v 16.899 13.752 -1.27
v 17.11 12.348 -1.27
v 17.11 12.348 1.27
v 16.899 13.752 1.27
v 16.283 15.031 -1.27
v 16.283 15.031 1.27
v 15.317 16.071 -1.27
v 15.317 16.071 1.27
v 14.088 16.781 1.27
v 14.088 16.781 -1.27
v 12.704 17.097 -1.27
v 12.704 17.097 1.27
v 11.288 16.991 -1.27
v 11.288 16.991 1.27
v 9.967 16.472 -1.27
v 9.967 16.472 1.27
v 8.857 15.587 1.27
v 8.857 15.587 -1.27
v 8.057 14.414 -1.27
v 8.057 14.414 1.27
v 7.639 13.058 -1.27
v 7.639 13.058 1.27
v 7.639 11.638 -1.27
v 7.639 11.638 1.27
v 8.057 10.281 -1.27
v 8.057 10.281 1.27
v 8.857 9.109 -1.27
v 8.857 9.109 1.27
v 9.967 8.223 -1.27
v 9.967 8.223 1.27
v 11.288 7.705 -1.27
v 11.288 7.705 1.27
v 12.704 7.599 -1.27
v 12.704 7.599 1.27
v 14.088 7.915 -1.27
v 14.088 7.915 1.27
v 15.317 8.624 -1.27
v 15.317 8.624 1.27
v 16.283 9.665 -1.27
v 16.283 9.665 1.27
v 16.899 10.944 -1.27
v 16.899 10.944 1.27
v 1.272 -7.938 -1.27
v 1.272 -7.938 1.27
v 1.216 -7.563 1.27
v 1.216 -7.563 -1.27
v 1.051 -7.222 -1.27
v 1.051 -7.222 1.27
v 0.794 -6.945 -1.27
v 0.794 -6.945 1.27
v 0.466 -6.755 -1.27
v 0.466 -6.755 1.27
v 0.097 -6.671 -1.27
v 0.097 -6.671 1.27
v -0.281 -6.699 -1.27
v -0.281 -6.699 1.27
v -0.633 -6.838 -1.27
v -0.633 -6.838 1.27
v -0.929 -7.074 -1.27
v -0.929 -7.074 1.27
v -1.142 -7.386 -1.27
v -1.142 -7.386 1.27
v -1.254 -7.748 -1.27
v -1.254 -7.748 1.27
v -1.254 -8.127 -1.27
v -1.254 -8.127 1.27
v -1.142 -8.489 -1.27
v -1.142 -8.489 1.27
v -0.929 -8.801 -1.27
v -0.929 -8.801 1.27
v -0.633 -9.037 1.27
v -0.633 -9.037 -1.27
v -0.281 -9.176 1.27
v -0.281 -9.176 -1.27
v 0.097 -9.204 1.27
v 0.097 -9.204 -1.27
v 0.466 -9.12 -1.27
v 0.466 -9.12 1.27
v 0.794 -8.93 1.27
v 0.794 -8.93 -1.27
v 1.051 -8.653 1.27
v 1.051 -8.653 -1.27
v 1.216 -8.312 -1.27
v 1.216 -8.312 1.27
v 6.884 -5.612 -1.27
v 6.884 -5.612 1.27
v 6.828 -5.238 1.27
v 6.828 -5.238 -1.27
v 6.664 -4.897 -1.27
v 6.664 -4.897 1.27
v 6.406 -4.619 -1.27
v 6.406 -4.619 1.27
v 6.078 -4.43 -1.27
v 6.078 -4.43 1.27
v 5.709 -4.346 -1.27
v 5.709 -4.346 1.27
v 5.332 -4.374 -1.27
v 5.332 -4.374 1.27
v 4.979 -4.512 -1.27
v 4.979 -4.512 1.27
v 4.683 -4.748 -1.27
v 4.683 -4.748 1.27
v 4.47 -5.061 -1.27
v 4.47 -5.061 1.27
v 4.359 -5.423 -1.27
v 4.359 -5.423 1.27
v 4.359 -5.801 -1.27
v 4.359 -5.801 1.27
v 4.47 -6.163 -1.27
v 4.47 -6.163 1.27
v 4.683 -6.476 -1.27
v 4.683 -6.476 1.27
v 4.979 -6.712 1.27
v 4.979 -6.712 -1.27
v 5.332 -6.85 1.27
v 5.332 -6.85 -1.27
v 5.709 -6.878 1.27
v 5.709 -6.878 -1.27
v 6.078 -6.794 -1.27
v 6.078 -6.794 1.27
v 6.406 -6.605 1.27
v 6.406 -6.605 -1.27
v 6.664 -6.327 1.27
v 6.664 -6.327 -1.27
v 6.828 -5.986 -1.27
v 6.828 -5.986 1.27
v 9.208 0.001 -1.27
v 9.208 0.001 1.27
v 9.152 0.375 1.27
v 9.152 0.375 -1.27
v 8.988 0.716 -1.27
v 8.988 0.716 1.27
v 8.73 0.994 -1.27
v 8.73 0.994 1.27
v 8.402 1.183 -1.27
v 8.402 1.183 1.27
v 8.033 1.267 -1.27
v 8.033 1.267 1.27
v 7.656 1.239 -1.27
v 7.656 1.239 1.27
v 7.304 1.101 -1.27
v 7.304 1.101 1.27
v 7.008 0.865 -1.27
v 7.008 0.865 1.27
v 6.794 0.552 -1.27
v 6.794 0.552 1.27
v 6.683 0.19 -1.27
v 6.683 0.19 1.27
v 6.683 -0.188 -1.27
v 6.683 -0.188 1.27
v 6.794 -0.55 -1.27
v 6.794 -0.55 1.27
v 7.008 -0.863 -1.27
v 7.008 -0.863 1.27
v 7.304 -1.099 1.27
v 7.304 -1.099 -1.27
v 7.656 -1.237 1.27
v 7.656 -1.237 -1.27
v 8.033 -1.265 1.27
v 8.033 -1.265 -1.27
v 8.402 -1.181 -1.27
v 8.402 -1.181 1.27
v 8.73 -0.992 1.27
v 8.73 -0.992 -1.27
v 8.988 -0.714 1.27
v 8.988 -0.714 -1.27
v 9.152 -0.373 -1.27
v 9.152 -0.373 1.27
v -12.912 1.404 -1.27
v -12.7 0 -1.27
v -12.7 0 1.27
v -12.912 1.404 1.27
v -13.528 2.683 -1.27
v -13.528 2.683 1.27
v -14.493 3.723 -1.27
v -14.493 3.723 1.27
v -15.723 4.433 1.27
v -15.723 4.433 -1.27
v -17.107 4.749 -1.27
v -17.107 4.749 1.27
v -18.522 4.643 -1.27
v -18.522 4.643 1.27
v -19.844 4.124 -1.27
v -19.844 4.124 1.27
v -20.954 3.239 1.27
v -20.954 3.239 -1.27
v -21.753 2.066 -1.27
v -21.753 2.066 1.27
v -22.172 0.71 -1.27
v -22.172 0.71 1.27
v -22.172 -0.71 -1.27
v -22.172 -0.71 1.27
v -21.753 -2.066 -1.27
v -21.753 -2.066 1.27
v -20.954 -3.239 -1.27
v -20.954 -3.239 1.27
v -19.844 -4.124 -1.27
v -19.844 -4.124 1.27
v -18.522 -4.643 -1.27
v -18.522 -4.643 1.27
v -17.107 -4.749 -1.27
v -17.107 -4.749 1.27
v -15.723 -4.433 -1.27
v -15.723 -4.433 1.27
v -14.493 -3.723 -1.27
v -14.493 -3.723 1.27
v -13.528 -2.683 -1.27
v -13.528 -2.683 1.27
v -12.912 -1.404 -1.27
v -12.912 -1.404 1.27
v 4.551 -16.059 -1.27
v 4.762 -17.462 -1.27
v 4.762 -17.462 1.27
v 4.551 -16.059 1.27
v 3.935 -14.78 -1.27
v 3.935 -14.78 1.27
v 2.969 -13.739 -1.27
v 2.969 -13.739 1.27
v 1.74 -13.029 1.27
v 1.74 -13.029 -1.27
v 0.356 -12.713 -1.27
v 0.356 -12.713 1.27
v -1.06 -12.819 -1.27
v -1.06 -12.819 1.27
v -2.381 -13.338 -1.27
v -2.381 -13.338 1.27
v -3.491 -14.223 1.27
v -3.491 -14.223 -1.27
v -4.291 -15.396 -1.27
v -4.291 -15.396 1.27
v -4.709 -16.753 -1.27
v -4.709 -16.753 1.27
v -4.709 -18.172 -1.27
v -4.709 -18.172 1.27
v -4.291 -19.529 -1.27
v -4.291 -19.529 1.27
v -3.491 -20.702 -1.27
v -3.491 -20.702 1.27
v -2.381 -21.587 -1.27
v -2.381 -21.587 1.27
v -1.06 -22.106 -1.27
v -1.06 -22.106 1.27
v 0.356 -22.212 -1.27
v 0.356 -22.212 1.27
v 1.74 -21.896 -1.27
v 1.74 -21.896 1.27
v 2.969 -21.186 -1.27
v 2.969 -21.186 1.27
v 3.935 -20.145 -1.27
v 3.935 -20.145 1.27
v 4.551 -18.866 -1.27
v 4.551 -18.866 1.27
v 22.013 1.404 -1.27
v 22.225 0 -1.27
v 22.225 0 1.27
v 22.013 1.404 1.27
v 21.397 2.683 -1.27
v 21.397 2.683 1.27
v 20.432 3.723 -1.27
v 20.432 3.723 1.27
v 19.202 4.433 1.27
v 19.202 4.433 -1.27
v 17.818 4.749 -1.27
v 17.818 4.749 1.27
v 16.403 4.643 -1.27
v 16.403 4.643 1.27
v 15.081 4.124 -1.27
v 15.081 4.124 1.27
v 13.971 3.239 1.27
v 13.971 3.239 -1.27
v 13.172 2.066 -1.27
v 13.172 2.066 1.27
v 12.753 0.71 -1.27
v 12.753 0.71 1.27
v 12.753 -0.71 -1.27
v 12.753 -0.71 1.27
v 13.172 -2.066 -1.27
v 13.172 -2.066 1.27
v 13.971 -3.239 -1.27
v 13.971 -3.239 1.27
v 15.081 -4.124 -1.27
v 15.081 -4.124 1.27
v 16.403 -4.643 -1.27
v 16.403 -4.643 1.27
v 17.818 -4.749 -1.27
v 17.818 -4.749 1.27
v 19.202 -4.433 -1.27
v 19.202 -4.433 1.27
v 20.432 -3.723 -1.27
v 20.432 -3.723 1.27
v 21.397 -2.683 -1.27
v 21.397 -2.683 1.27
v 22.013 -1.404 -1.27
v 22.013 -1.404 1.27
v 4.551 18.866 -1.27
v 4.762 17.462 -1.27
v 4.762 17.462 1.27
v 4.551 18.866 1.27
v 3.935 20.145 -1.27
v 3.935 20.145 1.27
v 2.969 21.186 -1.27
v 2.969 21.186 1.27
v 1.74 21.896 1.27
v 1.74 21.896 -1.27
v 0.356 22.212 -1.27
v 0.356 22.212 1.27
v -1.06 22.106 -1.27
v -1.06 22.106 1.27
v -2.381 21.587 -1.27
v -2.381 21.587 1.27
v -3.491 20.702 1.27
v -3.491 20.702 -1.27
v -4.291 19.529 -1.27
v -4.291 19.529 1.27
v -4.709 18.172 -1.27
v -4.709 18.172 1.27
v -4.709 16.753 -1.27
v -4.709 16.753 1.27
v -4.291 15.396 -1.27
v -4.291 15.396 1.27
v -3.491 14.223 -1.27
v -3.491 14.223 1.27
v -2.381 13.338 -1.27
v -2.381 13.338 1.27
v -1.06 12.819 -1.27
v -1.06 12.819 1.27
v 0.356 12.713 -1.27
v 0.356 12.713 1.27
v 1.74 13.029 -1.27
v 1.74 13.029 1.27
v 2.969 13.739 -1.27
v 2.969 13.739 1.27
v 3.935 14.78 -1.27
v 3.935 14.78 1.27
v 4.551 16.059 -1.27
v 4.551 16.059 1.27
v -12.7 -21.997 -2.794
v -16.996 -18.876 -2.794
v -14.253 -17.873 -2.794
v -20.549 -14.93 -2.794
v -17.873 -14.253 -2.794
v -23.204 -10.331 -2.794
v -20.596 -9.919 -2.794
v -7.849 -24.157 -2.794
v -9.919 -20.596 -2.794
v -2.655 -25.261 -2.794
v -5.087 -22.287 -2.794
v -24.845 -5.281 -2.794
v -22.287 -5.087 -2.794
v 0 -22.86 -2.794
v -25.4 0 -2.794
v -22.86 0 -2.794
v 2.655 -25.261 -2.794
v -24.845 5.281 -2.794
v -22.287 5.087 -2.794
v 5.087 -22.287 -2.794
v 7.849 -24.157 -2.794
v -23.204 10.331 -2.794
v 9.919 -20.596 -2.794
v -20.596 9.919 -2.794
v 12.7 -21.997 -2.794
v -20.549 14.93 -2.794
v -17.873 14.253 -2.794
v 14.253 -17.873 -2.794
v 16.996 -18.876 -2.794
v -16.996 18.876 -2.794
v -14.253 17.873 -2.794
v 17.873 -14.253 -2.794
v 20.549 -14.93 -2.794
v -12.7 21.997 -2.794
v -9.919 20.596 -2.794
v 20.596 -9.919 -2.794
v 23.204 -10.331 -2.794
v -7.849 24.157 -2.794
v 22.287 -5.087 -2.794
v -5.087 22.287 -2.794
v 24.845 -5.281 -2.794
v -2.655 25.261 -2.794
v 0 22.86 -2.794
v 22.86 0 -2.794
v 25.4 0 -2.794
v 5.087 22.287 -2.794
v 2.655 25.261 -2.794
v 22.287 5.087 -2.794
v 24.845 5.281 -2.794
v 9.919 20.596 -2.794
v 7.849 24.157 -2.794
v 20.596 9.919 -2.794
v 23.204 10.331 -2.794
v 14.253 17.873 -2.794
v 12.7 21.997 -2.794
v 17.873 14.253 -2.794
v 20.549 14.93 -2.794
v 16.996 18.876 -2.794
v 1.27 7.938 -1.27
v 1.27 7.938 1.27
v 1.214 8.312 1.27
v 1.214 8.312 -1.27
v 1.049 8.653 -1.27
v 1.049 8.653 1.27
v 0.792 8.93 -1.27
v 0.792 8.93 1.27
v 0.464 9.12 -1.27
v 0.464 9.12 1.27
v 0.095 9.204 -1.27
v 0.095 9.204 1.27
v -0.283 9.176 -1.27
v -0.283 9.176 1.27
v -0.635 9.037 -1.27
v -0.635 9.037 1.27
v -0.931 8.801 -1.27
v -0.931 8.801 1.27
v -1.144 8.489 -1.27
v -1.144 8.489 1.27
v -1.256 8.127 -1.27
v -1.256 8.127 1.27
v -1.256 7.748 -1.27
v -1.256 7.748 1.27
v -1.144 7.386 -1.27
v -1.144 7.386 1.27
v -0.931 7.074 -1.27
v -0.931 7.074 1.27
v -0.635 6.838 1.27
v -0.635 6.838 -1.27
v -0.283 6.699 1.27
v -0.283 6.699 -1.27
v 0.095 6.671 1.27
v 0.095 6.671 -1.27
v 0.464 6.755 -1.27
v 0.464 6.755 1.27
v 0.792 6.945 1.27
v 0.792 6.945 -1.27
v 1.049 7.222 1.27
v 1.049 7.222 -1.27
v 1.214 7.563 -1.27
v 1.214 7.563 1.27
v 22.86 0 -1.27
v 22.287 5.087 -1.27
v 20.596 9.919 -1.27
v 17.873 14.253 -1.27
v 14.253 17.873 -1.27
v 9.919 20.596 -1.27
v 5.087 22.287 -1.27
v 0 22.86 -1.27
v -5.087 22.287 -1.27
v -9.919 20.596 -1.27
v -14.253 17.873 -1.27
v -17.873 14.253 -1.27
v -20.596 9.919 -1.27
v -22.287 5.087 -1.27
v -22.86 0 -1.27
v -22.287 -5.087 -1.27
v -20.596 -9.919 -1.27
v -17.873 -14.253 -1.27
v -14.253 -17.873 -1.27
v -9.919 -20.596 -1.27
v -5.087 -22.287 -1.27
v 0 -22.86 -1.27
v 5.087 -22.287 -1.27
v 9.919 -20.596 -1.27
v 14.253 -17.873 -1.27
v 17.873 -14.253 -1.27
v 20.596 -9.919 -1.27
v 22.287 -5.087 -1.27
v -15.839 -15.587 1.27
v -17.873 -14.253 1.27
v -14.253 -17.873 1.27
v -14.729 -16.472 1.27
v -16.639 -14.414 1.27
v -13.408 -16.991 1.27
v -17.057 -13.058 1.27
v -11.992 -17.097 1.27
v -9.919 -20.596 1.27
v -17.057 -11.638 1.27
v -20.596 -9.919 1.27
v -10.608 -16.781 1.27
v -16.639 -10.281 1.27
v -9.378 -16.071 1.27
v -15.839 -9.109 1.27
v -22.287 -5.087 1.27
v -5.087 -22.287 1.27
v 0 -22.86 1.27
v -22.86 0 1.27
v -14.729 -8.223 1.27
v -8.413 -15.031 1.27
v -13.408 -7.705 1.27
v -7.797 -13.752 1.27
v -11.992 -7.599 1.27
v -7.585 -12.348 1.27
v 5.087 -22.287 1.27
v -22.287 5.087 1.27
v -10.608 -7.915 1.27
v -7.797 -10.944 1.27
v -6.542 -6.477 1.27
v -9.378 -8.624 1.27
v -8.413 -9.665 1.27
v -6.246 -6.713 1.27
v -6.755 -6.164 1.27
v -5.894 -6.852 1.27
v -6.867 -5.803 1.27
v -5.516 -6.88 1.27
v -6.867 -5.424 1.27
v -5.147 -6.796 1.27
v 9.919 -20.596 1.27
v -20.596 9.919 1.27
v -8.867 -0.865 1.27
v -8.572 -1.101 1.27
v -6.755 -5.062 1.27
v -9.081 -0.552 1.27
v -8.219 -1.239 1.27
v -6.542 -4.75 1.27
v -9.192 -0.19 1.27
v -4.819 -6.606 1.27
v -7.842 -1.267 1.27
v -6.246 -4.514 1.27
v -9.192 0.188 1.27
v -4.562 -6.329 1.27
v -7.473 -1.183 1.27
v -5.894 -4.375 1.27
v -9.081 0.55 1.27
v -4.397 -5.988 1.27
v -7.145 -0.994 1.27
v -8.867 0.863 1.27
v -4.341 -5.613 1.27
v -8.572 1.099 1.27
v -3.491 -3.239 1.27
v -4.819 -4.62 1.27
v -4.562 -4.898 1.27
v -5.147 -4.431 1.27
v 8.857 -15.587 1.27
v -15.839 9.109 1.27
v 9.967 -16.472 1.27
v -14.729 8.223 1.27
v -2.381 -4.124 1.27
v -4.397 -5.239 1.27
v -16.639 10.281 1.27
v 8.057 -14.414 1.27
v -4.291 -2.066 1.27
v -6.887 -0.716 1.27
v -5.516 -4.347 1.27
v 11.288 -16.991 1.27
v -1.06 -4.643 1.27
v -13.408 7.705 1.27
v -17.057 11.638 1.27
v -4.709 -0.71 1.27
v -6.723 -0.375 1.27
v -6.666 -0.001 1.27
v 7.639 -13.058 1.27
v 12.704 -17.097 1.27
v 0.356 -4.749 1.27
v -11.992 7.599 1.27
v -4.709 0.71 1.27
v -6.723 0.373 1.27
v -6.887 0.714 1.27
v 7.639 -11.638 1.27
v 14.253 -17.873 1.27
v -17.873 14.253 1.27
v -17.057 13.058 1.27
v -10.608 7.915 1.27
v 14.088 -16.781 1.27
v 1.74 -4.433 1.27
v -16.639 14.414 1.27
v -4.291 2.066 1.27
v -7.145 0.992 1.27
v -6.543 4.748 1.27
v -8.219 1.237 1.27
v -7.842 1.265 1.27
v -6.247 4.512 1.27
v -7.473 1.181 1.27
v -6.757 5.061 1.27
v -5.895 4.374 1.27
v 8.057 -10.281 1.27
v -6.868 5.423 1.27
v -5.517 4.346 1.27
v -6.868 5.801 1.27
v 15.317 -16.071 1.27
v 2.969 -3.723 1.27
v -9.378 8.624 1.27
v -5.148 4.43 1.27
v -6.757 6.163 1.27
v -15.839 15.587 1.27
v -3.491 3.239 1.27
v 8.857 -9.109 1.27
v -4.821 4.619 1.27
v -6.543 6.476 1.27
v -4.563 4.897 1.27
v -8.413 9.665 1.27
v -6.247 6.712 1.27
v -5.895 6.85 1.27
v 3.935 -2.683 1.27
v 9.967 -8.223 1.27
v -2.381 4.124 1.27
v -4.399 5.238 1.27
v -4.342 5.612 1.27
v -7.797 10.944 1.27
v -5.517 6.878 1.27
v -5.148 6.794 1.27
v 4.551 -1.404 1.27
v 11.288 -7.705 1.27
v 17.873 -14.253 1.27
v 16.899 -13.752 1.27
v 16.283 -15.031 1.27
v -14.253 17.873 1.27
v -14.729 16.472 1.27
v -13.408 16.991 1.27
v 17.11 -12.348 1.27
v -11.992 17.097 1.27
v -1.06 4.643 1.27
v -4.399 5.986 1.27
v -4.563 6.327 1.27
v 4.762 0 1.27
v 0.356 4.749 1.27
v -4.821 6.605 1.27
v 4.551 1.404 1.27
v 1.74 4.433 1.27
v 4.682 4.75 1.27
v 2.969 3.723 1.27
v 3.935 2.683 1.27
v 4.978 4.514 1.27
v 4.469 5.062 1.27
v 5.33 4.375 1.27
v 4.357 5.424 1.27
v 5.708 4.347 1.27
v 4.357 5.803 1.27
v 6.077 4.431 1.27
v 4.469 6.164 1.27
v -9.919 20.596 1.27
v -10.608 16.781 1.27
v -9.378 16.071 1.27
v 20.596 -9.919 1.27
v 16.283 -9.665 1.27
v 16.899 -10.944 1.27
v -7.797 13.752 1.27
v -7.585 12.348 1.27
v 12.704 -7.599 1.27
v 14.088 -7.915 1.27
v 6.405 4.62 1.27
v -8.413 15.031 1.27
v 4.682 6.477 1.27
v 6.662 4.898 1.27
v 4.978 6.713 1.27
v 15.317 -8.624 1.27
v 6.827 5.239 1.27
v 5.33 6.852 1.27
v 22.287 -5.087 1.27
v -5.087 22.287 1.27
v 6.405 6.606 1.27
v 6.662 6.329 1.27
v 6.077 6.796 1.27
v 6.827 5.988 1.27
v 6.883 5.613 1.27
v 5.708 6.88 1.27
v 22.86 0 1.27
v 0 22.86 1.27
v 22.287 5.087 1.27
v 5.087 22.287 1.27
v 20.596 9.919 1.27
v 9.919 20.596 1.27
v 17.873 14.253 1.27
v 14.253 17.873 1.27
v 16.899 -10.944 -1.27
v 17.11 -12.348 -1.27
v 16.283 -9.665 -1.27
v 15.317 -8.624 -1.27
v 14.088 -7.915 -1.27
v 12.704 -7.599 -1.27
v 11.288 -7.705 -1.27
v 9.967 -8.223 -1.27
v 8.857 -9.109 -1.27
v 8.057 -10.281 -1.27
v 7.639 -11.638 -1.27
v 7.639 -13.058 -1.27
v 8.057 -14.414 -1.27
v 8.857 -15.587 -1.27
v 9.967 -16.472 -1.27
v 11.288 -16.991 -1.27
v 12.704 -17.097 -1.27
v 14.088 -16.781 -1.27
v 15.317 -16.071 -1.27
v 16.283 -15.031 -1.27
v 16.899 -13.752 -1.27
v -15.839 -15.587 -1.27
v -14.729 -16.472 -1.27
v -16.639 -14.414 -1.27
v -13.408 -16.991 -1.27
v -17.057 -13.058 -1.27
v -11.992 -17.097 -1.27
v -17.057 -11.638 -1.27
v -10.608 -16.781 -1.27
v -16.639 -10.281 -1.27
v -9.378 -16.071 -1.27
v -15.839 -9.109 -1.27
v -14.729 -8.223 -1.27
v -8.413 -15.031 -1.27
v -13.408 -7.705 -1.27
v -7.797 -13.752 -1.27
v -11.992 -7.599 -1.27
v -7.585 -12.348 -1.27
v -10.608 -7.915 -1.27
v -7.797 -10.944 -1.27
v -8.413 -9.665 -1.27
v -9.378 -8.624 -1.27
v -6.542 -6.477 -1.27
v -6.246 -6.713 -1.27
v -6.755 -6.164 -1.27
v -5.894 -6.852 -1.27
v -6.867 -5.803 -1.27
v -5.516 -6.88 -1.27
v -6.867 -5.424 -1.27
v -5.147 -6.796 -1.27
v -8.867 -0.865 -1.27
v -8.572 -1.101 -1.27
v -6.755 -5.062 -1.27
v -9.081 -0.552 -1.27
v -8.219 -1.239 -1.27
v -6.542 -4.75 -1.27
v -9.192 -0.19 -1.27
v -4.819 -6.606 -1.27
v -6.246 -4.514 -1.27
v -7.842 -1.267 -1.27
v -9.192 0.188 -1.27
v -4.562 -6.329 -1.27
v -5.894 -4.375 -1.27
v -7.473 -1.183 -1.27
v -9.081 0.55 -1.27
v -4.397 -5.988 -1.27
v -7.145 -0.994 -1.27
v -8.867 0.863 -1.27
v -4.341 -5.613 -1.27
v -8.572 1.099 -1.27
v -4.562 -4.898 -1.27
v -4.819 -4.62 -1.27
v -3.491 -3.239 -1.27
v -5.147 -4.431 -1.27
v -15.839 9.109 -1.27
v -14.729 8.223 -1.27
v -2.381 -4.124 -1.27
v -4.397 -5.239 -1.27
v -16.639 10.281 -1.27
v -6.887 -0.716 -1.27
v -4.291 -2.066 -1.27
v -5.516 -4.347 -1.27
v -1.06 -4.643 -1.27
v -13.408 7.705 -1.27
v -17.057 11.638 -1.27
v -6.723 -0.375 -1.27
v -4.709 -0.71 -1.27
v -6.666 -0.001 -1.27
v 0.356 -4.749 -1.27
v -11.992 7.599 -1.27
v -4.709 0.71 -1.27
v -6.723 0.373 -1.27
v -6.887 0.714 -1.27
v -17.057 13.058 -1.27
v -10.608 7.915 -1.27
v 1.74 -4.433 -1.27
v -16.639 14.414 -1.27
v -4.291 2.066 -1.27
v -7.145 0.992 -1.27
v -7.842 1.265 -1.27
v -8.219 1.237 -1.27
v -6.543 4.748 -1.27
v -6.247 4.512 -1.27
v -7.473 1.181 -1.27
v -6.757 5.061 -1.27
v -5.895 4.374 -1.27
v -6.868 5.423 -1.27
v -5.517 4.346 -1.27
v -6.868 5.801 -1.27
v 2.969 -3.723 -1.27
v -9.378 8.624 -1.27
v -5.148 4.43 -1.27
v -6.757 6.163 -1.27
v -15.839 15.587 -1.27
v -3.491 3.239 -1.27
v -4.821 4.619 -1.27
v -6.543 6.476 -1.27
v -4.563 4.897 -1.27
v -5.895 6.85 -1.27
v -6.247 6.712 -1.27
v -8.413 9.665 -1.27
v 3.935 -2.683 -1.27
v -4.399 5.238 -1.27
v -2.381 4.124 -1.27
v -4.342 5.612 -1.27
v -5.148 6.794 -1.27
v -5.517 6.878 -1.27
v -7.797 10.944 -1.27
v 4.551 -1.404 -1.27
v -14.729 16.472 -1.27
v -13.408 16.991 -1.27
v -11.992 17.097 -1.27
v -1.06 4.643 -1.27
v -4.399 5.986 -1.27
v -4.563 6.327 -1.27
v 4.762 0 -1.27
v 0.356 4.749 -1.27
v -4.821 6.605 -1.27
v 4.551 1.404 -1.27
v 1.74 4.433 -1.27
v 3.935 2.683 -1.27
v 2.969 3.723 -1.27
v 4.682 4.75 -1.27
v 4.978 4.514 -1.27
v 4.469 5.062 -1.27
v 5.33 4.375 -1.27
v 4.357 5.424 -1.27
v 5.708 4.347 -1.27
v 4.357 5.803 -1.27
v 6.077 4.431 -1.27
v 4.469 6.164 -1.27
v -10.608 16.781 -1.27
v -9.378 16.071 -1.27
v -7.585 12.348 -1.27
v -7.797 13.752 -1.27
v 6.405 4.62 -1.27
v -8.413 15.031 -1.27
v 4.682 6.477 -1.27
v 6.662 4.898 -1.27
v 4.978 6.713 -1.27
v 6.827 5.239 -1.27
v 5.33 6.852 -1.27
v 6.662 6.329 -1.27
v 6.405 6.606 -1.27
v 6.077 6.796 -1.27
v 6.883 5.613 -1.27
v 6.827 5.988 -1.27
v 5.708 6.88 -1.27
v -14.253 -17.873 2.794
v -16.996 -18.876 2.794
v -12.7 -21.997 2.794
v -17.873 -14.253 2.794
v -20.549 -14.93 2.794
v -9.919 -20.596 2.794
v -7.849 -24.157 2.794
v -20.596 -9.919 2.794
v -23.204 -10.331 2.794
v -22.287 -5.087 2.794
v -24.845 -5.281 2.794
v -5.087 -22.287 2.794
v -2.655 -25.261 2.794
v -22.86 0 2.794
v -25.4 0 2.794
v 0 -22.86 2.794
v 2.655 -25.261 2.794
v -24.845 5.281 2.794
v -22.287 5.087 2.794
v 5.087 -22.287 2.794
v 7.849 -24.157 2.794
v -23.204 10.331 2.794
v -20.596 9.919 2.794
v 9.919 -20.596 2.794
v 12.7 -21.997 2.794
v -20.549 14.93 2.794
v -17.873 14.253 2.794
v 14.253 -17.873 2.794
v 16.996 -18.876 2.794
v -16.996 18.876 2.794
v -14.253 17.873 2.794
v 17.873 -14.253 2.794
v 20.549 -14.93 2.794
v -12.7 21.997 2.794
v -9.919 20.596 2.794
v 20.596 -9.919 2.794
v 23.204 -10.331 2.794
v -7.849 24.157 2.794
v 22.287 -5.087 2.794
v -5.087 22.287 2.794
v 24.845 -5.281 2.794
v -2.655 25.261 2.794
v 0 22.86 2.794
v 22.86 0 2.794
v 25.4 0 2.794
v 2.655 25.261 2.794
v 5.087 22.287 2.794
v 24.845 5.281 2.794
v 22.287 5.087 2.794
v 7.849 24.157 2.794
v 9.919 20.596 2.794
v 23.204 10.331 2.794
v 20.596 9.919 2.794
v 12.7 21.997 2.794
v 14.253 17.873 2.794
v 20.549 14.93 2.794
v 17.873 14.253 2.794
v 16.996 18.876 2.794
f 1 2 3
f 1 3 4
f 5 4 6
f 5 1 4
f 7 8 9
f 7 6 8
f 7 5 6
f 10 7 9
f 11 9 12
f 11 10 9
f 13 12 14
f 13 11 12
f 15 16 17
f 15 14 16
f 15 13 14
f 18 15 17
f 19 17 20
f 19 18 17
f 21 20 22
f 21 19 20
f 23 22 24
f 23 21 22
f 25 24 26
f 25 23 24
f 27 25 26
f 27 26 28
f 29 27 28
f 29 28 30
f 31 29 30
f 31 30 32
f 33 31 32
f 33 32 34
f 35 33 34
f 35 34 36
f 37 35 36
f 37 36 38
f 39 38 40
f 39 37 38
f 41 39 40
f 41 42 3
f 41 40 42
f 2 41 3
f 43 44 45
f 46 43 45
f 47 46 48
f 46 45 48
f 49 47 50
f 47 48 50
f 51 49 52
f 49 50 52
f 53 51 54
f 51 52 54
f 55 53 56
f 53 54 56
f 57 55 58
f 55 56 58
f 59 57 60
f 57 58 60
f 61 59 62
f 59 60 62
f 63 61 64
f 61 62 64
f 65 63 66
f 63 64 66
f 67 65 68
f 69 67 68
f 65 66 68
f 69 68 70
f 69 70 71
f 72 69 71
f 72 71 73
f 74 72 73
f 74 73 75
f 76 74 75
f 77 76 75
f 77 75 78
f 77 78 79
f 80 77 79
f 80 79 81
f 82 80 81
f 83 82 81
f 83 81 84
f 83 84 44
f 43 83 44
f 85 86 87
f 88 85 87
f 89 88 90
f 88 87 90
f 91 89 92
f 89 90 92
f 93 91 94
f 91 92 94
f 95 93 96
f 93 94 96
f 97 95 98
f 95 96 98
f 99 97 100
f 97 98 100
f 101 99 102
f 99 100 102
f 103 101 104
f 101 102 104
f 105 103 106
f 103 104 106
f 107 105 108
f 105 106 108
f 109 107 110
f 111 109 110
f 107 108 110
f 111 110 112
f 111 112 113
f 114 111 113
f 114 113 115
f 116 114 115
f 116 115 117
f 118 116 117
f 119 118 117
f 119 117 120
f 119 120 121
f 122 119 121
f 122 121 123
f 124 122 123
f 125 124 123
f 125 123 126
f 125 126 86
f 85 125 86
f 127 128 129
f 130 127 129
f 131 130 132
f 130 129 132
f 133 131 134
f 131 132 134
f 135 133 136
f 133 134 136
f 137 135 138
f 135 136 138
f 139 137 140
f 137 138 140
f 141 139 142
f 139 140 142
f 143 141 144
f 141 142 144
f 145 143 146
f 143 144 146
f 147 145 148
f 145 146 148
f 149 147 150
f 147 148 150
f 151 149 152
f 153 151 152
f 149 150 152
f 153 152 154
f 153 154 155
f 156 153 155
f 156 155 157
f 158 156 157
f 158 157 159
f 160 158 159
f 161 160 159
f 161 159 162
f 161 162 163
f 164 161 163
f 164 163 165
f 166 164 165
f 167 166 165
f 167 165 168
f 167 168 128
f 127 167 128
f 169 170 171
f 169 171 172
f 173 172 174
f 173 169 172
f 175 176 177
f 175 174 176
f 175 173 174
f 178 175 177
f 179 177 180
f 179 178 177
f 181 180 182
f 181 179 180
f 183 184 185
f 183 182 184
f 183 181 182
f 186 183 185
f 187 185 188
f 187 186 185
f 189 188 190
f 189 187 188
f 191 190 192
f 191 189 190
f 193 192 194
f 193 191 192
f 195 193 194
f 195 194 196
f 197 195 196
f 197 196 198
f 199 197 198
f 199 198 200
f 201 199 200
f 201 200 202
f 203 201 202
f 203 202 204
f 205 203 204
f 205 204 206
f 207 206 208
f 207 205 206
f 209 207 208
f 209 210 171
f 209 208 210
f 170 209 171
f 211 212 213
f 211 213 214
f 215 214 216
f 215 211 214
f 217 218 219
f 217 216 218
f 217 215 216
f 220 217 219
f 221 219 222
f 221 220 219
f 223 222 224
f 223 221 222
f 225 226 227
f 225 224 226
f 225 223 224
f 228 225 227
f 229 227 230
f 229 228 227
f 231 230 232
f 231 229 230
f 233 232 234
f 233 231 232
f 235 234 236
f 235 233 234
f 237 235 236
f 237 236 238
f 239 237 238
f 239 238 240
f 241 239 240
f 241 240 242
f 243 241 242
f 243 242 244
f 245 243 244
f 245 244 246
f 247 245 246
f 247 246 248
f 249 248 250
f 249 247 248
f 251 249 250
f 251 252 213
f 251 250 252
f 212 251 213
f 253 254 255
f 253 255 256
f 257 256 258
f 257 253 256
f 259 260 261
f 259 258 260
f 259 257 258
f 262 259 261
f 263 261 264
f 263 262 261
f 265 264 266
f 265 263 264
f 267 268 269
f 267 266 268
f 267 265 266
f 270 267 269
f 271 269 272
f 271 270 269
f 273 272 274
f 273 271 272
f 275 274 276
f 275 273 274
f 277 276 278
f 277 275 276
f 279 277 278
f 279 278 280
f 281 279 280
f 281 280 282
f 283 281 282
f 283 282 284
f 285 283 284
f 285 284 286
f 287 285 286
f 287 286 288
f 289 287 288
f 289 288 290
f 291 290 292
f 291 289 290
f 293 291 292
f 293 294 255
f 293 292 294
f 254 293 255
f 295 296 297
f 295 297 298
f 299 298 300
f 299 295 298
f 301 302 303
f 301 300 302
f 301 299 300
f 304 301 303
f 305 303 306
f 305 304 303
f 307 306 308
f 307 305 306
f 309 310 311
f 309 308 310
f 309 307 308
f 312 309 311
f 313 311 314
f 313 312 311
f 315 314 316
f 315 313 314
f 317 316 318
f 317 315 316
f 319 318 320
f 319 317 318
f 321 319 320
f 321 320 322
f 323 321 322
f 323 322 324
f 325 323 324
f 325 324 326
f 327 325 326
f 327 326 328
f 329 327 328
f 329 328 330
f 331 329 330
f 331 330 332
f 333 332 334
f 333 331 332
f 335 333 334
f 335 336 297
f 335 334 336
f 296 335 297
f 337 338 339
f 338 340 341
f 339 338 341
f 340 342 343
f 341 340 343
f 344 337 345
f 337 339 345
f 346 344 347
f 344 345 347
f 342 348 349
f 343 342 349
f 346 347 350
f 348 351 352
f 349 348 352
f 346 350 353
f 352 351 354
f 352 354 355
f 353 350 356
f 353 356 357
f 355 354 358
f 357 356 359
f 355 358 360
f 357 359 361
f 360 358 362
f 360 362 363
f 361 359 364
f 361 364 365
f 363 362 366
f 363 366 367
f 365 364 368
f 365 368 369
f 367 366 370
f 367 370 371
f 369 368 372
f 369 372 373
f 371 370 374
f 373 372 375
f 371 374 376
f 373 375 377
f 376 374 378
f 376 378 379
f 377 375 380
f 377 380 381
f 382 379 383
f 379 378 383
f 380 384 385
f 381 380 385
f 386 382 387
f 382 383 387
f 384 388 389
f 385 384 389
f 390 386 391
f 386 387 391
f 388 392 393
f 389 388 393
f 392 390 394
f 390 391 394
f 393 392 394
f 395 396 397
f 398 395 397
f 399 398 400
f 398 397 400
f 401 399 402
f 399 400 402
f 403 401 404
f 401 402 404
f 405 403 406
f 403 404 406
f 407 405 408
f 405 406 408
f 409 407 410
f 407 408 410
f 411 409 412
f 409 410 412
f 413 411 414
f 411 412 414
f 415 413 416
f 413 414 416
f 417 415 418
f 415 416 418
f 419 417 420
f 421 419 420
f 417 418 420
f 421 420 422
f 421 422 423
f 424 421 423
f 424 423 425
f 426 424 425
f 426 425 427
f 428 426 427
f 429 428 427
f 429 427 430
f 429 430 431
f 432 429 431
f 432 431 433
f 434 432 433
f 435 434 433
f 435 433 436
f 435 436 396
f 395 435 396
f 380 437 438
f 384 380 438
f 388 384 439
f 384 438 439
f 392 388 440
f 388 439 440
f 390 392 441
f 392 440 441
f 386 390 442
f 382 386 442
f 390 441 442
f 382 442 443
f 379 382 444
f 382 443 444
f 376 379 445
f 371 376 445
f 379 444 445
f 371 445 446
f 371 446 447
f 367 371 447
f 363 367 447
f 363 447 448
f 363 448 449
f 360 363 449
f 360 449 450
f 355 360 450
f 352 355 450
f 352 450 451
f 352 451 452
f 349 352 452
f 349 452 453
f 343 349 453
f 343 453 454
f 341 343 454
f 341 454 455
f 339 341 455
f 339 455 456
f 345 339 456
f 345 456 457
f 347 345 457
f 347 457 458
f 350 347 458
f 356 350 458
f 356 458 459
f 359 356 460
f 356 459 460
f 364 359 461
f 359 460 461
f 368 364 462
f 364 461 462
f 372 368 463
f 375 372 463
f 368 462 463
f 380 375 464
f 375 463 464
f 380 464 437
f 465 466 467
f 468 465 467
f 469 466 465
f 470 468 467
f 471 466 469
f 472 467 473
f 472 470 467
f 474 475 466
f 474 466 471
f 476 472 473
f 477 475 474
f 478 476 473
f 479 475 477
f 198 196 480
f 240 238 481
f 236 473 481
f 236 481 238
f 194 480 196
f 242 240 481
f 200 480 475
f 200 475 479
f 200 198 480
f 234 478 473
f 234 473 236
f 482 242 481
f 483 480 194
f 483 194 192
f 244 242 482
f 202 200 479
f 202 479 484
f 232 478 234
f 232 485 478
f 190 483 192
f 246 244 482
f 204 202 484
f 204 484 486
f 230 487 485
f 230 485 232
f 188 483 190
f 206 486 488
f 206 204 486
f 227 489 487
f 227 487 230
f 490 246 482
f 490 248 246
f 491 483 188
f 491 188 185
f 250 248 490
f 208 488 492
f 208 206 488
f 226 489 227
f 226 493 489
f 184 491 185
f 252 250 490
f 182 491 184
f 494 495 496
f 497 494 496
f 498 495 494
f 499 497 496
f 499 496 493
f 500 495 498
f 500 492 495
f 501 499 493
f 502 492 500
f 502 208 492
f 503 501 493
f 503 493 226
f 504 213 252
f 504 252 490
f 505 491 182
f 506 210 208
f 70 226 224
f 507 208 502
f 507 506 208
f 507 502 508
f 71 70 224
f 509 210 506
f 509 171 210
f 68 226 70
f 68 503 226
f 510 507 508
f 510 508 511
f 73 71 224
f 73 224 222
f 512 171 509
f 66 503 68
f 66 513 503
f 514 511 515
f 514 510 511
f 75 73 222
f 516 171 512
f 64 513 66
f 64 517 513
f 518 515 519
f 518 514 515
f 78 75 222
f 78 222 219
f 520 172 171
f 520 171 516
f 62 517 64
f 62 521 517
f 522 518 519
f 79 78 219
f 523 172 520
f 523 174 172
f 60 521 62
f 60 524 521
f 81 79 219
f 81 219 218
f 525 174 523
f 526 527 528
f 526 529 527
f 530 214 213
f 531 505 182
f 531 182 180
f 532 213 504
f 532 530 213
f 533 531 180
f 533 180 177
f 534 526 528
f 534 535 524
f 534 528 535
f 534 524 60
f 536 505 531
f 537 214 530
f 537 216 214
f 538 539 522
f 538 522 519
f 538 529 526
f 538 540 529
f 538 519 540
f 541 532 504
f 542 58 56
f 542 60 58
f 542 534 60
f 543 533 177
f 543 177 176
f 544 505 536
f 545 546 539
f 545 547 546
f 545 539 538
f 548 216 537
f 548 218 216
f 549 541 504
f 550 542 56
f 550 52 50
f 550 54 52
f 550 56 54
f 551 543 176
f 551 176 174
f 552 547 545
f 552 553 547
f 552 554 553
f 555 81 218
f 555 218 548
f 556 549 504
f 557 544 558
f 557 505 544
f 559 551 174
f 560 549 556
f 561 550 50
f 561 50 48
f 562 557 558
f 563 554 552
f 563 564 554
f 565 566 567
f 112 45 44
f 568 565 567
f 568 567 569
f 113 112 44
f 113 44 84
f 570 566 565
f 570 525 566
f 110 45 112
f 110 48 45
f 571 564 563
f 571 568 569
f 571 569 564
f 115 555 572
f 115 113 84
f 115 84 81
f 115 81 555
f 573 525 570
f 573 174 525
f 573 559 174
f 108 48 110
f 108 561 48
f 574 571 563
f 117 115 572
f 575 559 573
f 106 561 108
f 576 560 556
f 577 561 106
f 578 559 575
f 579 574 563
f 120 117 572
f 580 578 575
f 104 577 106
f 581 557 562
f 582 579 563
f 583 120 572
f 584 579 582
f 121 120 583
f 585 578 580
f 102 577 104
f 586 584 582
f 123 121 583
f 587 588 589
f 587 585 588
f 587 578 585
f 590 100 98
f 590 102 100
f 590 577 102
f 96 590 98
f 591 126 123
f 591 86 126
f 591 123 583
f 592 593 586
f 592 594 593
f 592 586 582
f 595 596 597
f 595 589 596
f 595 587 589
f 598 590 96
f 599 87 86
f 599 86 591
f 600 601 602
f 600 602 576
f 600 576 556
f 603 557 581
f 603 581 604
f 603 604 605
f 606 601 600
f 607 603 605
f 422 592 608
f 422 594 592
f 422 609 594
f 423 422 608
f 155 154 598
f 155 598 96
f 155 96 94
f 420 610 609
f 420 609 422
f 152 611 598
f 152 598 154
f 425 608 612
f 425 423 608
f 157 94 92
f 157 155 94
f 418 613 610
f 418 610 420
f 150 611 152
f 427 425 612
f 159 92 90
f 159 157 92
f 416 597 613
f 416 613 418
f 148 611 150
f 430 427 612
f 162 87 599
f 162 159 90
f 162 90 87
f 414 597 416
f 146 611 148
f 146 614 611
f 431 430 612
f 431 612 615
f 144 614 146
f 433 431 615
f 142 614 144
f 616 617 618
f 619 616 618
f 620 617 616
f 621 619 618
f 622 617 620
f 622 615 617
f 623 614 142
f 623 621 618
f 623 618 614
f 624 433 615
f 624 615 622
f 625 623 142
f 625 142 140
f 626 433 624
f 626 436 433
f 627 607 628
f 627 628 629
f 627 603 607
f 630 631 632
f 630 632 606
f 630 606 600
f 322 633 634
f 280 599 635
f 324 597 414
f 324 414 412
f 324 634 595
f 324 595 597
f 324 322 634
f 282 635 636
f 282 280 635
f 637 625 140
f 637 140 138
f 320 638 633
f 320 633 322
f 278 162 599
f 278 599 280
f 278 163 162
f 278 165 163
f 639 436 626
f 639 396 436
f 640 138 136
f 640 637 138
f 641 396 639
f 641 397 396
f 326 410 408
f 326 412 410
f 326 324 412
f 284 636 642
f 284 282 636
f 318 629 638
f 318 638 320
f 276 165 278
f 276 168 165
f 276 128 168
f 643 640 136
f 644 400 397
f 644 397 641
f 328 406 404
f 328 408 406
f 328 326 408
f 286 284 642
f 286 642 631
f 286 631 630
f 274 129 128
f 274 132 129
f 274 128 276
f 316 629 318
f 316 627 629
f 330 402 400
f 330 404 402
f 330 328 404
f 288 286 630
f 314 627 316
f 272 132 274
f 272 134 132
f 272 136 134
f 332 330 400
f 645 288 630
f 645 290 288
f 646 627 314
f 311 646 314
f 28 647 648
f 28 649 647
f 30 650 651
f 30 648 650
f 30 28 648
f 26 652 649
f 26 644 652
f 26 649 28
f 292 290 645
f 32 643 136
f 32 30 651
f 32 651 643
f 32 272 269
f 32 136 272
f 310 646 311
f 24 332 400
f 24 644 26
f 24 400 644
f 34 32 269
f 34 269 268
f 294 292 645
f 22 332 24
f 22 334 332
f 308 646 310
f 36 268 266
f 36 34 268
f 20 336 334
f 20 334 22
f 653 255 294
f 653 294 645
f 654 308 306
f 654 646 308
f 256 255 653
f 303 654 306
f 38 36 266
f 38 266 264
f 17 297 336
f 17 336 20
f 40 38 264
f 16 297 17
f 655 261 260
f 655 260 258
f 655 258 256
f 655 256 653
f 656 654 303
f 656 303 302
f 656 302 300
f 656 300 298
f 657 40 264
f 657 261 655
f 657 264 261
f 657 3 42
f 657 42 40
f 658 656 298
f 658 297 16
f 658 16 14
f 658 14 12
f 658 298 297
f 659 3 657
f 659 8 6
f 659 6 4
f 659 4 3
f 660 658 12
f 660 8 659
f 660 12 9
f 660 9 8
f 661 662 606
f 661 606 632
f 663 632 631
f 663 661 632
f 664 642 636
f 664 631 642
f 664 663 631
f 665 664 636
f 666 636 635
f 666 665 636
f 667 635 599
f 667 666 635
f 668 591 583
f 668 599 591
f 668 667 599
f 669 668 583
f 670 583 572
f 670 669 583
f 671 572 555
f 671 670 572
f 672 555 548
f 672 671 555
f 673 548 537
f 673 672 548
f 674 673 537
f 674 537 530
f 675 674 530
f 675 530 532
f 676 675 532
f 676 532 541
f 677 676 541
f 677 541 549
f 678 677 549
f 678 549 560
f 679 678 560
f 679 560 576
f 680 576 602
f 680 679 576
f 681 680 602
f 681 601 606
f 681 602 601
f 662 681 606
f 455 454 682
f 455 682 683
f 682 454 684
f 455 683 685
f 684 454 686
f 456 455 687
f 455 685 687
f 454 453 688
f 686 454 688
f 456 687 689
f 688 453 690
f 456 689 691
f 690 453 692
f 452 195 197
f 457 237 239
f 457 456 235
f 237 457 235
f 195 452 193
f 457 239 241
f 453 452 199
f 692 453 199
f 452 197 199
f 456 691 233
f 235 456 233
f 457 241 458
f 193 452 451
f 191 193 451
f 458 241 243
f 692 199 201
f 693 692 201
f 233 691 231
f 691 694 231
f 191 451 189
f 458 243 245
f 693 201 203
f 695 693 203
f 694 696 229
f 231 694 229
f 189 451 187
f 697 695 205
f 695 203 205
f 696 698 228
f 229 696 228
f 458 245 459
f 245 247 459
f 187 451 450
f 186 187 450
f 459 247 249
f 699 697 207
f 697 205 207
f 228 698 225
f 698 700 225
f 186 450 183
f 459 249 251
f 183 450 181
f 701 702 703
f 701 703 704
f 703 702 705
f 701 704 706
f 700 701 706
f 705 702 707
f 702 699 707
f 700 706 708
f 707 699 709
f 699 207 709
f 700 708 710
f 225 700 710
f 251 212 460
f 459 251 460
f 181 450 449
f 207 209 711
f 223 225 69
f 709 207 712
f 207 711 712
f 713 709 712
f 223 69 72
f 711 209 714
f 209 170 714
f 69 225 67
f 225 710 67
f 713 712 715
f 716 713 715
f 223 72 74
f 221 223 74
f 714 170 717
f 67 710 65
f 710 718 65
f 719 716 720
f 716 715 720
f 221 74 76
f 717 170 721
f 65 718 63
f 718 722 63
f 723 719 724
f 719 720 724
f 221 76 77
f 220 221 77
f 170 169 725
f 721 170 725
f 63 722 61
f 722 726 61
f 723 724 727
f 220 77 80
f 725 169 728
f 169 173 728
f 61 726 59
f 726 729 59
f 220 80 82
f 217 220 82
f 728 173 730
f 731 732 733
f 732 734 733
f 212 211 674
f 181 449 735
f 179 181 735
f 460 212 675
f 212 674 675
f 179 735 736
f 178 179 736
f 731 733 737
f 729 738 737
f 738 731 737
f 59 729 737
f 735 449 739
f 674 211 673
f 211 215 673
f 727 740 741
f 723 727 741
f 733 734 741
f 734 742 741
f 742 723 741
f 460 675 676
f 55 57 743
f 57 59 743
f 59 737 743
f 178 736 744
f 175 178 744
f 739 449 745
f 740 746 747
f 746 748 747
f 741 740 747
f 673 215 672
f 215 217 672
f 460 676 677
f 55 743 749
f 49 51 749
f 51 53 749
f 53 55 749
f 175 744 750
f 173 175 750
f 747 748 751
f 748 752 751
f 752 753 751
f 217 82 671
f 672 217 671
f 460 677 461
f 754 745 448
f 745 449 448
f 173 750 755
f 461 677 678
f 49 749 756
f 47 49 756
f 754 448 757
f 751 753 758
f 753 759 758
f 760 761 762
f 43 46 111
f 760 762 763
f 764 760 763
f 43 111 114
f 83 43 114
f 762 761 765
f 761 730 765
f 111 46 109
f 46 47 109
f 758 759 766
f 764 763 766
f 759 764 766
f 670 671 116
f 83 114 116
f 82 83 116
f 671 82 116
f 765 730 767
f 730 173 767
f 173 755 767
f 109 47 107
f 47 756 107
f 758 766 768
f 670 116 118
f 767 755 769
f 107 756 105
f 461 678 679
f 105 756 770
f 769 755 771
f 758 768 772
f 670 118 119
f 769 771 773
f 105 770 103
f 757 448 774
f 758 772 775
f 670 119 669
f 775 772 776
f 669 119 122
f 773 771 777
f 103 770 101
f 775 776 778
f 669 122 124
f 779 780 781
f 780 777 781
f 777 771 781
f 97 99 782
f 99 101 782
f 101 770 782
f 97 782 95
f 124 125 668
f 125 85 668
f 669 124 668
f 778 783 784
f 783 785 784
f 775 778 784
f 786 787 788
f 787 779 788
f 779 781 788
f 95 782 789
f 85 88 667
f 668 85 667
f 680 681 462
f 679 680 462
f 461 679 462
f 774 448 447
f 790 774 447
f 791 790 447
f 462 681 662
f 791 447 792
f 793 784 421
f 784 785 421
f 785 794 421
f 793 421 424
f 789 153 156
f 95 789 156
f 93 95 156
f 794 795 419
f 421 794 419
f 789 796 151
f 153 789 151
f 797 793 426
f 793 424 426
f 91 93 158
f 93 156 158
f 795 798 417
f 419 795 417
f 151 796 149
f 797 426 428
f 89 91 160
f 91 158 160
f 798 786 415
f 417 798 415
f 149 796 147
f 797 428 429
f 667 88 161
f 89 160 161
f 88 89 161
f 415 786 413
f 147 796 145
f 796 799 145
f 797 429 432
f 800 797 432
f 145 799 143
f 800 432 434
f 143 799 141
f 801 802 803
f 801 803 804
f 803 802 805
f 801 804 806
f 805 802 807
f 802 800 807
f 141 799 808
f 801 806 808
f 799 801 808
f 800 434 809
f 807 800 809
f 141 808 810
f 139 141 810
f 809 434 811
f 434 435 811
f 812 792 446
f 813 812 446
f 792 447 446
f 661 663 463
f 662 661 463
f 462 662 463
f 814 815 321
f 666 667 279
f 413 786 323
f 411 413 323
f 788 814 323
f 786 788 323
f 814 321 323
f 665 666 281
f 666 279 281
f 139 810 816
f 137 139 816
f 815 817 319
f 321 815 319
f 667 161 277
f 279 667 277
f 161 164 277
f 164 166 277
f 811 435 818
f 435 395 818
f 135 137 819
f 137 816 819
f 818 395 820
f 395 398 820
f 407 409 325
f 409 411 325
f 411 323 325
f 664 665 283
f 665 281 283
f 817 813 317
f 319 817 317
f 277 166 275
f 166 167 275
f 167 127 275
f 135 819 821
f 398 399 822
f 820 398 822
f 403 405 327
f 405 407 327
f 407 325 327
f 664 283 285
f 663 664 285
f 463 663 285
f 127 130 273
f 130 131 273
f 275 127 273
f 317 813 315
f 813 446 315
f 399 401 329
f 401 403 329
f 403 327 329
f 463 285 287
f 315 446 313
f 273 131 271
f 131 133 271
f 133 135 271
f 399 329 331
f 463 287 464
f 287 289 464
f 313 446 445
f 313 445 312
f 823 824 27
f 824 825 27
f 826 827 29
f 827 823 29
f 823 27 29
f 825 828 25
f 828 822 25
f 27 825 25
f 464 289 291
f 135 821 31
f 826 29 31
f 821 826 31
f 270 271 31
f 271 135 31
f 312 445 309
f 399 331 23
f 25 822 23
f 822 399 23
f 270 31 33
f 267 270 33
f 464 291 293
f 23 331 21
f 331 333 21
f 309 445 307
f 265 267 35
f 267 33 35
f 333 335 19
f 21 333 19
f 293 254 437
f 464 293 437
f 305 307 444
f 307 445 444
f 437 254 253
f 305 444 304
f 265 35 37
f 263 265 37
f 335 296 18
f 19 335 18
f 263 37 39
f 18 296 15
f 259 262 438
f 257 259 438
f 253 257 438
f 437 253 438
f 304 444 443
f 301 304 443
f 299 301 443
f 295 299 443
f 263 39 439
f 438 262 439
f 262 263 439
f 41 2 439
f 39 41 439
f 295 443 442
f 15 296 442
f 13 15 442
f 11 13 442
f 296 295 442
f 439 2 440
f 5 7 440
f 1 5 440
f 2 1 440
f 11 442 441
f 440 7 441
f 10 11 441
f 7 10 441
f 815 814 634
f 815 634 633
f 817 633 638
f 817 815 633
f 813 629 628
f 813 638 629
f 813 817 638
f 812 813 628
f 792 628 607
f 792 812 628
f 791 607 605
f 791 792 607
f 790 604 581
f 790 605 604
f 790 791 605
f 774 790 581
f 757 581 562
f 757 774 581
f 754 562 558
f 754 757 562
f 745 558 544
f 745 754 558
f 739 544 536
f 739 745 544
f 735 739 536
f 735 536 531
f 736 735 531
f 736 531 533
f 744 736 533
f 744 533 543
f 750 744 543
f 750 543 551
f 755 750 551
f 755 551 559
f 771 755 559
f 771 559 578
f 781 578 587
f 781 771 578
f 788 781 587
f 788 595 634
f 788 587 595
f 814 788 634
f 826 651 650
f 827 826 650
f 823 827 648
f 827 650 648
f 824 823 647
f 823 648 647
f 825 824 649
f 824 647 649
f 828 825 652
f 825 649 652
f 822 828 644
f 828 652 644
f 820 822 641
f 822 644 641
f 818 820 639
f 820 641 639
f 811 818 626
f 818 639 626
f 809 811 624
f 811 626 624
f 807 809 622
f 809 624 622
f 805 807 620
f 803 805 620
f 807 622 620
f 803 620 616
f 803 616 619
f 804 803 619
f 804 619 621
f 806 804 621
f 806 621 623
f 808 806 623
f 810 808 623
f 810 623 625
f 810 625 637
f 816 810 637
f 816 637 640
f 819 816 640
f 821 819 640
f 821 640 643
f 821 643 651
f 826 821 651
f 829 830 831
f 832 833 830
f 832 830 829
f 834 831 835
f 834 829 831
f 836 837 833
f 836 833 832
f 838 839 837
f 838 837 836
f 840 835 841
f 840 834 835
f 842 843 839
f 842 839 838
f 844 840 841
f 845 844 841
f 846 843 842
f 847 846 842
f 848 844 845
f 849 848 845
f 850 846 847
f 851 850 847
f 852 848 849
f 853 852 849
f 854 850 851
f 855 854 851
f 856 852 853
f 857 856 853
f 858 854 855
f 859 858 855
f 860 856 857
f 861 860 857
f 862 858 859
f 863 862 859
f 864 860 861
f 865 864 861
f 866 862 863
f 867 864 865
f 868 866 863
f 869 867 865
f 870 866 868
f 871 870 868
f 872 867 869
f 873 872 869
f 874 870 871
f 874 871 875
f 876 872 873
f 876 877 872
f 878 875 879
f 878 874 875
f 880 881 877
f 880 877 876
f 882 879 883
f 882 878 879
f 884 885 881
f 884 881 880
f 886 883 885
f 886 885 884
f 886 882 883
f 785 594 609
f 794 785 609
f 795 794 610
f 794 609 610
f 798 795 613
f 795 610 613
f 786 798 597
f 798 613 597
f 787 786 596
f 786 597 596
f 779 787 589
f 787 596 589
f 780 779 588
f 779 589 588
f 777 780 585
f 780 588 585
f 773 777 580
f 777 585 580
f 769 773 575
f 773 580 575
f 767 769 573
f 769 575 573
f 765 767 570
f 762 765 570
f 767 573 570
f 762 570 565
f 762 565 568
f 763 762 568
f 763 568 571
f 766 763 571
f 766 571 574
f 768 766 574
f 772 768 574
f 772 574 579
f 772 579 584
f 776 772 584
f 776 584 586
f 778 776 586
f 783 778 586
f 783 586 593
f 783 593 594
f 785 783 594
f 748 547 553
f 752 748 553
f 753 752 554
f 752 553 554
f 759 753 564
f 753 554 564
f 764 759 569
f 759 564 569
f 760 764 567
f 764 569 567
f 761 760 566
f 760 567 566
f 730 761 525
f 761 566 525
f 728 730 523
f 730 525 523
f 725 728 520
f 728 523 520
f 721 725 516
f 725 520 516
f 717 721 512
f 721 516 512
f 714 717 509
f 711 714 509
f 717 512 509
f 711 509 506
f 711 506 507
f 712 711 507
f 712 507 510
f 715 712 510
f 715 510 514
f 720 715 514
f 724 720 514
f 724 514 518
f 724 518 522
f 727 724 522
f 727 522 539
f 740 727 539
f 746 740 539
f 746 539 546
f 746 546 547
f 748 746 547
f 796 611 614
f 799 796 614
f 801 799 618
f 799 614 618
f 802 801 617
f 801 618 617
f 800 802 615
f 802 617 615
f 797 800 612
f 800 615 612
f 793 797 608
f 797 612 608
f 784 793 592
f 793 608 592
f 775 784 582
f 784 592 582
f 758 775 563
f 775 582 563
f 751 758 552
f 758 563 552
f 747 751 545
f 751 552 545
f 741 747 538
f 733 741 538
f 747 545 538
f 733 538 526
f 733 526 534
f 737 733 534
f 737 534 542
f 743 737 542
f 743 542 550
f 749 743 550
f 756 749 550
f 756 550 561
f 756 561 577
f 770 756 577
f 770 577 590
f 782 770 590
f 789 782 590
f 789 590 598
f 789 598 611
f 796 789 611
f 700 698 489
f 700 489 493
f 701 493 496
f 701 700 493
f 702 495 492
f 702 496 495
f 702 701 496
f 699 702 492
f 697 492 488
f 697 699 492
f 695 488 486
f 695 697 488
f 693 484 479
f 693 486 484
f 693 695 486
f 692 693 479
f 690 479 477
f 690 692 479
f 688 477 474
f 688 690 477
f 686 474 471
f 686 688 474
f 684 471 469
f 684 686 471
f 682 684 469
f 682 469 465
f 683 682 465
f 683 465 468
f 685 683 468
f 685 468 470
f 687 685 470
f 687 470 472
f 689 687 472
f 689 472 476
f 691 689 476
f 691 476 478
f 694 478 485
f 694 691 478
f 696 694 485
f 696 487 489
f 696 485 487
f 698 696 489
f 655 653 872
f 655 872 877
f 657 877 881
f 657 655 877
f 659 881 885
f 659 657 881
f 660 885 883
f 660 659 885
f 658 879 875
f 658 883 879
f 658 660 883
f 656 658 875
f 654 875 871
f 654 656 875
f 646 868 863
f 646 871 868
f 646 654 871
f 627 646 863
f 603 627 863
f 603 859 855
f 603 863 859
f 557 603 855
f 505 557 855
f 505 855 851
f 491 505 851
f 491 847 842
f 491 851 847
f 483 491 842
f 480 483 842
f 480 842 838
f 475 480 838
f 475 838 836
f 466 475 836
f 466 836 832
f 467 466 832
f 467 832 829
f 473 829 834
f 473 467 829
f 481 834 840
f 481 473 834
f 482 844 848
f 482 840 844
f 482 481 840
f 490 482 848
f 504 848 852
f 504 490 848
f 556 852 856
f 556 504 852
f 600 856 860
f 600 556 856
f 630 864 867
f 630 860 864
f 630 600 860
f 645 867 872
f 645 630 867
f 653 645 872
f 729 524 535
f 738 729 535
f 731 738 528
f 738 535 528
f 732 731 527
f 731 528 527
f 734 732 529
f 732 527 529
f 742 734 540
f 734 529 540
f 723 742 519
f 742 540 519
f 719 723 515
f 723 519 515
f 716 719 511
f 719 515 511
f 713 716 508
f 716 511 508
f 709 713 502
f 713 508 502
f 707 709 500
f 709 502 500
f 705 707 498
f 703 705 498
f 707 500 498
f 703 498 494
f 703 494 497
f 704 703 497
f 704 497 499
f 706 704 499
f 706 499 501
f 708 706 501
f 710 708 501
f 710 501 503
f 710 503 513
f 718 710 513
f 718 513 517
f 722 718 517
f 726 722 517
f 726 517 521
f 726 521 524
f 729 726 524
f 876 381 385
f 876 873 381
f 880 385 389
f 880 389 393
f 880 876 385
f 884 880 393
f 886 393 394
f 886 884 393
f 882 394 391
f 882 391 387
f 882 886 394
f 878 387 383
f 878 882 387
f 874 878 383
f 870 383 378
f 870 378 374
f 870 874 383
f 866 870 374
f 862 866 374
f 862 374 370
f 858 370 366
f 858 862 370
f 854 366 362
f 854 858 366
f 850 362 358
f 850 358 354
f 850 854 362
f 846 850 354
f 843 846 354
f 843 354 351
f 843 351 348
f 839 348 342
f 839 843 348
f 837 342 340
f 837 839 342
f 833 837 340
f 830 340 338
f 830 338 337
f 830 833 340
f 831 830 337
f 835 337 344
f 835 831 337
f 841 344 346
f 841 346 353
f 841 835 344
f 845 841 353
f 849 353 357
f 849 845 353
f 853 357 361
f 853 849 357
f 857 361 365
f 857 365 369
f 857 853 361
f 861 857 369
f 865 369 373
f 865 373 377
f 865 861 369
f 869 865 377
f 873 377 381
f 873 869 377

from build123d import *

# Parameters (mm, degrees)
SKETCH1_R               = 25.4
BOSS_EXTRUDE1_DEPTH     = 2.794
SKETCH2_R               = 4.7625
SKETCH2_R_2             = 1.27
CUT_EXTRUDE1_DEPTH      = 37.353070627
CUT_EXTRUDE2_START      = -1.27
SKETCH3_R               = 22.86
CUT_EXTRUDE2_DEPTH      = 1.651
CUT_EXTRUDE3_DEPTH      = 37.029521729
CUT_EXTRUDE3_DEPTH_BACK = 37.029521729
SKETCH4_R               = 4.7625


with BuildPart() as part:
    # Sketch1 → Boss-Extrude1 (new, symmetric)
    with BuildSketch(Plane.XY):
        Circle(SKETCH1_R)
    extrude(amount=BOSS_EXTRUDE1_DEPTH, both=True)

    # Sketch2 → Cut-Extrude1 (cut, through all)
    with BuildSketch(Plane.XY.offset(2.794)):
        Circle(SKETCH2_R)
        with Locations((0, 7.9375)):
            Circle(SKETCH2_R_2)
        with Locations((5.612952969, 5.613367182)):
            Circle(SKETCH2_R_2)
        with Locations((7.9385, 0.001)):
            Circle(SKETCH2_R_2)
        with Locations((5.614367182, -5.611952969)):
            Circle(SKETCH2_R_2)
        with Locations((0.002, -7.9375)):
            Circle(SKETCH2_R_2)
        with Locations((-5.610952969, -5.613367182)):
            Circle(SKETCH2_R_2)
        with Locations((-7.9365, -0.001)):
            Circle(SKETCH2_R_2)
        with Locations((-5.612367182, 5.611952969)):
            Circle(SKETCH2_R_2)
    extrude(amount=-CUT_EXTRUDE1_DEPTH, mode=Mode.SUBTRACT)

    # Sketch3 → Cut-Extrude2 (cut)
    with BuildSketch(Plane.XY.offset(CUT_EXTRUDE2_START)):
        Circle(SKETCH3_R)
    cut_extrude2 = extrude(amount=-CUT_EXTRUDE2_DEPTH, mode=Mode.SUBTRACT)

    # Mirror1: Cut-Extrude2 across plane
    add(cut_extrude2.mirror(Plane.XY), mode=Mode.SUBTRACT)

    # Sketch4 → Cut-Extrude3 (cut, two sides: drawn at the far end of the back side and taken through both)
    with BuildSketch(Plane.XY.offset(-CUT_EXTRUDE3_DEPTH_BACK)):
        with Locations((0, 17.4625)):
            Circle(SKETCH4_R)
        with Locations((12.347852166, 12.347852166)):
            Circle(SKETCH4_R)
        with Locations((17.4625, 0)):
            Circle(SKETCH4_R)
        with Locations((12.347852166, -12.347852166)):
            Circle(SKETCH4_R)
        with Locations((0, -17.4625)):
            Circle(SKETCH4_R)
        with Locations((-12.347852166, -12.347852166)):
            Circle(SKETCH4_R)
        with Locations((-17.4625, 0)):
            Circle(SKETCH4_R)
        with Locations((-12.347852166, 12.347852166)):
            Circle(SKETCH4_R)
    extrude(amount=CUT_EXTRUDE3_DEPTH + CUT_EXTRUDE3_DEPTH_BACK, mode=Mode.SUBTRACT)


solid = part.part
